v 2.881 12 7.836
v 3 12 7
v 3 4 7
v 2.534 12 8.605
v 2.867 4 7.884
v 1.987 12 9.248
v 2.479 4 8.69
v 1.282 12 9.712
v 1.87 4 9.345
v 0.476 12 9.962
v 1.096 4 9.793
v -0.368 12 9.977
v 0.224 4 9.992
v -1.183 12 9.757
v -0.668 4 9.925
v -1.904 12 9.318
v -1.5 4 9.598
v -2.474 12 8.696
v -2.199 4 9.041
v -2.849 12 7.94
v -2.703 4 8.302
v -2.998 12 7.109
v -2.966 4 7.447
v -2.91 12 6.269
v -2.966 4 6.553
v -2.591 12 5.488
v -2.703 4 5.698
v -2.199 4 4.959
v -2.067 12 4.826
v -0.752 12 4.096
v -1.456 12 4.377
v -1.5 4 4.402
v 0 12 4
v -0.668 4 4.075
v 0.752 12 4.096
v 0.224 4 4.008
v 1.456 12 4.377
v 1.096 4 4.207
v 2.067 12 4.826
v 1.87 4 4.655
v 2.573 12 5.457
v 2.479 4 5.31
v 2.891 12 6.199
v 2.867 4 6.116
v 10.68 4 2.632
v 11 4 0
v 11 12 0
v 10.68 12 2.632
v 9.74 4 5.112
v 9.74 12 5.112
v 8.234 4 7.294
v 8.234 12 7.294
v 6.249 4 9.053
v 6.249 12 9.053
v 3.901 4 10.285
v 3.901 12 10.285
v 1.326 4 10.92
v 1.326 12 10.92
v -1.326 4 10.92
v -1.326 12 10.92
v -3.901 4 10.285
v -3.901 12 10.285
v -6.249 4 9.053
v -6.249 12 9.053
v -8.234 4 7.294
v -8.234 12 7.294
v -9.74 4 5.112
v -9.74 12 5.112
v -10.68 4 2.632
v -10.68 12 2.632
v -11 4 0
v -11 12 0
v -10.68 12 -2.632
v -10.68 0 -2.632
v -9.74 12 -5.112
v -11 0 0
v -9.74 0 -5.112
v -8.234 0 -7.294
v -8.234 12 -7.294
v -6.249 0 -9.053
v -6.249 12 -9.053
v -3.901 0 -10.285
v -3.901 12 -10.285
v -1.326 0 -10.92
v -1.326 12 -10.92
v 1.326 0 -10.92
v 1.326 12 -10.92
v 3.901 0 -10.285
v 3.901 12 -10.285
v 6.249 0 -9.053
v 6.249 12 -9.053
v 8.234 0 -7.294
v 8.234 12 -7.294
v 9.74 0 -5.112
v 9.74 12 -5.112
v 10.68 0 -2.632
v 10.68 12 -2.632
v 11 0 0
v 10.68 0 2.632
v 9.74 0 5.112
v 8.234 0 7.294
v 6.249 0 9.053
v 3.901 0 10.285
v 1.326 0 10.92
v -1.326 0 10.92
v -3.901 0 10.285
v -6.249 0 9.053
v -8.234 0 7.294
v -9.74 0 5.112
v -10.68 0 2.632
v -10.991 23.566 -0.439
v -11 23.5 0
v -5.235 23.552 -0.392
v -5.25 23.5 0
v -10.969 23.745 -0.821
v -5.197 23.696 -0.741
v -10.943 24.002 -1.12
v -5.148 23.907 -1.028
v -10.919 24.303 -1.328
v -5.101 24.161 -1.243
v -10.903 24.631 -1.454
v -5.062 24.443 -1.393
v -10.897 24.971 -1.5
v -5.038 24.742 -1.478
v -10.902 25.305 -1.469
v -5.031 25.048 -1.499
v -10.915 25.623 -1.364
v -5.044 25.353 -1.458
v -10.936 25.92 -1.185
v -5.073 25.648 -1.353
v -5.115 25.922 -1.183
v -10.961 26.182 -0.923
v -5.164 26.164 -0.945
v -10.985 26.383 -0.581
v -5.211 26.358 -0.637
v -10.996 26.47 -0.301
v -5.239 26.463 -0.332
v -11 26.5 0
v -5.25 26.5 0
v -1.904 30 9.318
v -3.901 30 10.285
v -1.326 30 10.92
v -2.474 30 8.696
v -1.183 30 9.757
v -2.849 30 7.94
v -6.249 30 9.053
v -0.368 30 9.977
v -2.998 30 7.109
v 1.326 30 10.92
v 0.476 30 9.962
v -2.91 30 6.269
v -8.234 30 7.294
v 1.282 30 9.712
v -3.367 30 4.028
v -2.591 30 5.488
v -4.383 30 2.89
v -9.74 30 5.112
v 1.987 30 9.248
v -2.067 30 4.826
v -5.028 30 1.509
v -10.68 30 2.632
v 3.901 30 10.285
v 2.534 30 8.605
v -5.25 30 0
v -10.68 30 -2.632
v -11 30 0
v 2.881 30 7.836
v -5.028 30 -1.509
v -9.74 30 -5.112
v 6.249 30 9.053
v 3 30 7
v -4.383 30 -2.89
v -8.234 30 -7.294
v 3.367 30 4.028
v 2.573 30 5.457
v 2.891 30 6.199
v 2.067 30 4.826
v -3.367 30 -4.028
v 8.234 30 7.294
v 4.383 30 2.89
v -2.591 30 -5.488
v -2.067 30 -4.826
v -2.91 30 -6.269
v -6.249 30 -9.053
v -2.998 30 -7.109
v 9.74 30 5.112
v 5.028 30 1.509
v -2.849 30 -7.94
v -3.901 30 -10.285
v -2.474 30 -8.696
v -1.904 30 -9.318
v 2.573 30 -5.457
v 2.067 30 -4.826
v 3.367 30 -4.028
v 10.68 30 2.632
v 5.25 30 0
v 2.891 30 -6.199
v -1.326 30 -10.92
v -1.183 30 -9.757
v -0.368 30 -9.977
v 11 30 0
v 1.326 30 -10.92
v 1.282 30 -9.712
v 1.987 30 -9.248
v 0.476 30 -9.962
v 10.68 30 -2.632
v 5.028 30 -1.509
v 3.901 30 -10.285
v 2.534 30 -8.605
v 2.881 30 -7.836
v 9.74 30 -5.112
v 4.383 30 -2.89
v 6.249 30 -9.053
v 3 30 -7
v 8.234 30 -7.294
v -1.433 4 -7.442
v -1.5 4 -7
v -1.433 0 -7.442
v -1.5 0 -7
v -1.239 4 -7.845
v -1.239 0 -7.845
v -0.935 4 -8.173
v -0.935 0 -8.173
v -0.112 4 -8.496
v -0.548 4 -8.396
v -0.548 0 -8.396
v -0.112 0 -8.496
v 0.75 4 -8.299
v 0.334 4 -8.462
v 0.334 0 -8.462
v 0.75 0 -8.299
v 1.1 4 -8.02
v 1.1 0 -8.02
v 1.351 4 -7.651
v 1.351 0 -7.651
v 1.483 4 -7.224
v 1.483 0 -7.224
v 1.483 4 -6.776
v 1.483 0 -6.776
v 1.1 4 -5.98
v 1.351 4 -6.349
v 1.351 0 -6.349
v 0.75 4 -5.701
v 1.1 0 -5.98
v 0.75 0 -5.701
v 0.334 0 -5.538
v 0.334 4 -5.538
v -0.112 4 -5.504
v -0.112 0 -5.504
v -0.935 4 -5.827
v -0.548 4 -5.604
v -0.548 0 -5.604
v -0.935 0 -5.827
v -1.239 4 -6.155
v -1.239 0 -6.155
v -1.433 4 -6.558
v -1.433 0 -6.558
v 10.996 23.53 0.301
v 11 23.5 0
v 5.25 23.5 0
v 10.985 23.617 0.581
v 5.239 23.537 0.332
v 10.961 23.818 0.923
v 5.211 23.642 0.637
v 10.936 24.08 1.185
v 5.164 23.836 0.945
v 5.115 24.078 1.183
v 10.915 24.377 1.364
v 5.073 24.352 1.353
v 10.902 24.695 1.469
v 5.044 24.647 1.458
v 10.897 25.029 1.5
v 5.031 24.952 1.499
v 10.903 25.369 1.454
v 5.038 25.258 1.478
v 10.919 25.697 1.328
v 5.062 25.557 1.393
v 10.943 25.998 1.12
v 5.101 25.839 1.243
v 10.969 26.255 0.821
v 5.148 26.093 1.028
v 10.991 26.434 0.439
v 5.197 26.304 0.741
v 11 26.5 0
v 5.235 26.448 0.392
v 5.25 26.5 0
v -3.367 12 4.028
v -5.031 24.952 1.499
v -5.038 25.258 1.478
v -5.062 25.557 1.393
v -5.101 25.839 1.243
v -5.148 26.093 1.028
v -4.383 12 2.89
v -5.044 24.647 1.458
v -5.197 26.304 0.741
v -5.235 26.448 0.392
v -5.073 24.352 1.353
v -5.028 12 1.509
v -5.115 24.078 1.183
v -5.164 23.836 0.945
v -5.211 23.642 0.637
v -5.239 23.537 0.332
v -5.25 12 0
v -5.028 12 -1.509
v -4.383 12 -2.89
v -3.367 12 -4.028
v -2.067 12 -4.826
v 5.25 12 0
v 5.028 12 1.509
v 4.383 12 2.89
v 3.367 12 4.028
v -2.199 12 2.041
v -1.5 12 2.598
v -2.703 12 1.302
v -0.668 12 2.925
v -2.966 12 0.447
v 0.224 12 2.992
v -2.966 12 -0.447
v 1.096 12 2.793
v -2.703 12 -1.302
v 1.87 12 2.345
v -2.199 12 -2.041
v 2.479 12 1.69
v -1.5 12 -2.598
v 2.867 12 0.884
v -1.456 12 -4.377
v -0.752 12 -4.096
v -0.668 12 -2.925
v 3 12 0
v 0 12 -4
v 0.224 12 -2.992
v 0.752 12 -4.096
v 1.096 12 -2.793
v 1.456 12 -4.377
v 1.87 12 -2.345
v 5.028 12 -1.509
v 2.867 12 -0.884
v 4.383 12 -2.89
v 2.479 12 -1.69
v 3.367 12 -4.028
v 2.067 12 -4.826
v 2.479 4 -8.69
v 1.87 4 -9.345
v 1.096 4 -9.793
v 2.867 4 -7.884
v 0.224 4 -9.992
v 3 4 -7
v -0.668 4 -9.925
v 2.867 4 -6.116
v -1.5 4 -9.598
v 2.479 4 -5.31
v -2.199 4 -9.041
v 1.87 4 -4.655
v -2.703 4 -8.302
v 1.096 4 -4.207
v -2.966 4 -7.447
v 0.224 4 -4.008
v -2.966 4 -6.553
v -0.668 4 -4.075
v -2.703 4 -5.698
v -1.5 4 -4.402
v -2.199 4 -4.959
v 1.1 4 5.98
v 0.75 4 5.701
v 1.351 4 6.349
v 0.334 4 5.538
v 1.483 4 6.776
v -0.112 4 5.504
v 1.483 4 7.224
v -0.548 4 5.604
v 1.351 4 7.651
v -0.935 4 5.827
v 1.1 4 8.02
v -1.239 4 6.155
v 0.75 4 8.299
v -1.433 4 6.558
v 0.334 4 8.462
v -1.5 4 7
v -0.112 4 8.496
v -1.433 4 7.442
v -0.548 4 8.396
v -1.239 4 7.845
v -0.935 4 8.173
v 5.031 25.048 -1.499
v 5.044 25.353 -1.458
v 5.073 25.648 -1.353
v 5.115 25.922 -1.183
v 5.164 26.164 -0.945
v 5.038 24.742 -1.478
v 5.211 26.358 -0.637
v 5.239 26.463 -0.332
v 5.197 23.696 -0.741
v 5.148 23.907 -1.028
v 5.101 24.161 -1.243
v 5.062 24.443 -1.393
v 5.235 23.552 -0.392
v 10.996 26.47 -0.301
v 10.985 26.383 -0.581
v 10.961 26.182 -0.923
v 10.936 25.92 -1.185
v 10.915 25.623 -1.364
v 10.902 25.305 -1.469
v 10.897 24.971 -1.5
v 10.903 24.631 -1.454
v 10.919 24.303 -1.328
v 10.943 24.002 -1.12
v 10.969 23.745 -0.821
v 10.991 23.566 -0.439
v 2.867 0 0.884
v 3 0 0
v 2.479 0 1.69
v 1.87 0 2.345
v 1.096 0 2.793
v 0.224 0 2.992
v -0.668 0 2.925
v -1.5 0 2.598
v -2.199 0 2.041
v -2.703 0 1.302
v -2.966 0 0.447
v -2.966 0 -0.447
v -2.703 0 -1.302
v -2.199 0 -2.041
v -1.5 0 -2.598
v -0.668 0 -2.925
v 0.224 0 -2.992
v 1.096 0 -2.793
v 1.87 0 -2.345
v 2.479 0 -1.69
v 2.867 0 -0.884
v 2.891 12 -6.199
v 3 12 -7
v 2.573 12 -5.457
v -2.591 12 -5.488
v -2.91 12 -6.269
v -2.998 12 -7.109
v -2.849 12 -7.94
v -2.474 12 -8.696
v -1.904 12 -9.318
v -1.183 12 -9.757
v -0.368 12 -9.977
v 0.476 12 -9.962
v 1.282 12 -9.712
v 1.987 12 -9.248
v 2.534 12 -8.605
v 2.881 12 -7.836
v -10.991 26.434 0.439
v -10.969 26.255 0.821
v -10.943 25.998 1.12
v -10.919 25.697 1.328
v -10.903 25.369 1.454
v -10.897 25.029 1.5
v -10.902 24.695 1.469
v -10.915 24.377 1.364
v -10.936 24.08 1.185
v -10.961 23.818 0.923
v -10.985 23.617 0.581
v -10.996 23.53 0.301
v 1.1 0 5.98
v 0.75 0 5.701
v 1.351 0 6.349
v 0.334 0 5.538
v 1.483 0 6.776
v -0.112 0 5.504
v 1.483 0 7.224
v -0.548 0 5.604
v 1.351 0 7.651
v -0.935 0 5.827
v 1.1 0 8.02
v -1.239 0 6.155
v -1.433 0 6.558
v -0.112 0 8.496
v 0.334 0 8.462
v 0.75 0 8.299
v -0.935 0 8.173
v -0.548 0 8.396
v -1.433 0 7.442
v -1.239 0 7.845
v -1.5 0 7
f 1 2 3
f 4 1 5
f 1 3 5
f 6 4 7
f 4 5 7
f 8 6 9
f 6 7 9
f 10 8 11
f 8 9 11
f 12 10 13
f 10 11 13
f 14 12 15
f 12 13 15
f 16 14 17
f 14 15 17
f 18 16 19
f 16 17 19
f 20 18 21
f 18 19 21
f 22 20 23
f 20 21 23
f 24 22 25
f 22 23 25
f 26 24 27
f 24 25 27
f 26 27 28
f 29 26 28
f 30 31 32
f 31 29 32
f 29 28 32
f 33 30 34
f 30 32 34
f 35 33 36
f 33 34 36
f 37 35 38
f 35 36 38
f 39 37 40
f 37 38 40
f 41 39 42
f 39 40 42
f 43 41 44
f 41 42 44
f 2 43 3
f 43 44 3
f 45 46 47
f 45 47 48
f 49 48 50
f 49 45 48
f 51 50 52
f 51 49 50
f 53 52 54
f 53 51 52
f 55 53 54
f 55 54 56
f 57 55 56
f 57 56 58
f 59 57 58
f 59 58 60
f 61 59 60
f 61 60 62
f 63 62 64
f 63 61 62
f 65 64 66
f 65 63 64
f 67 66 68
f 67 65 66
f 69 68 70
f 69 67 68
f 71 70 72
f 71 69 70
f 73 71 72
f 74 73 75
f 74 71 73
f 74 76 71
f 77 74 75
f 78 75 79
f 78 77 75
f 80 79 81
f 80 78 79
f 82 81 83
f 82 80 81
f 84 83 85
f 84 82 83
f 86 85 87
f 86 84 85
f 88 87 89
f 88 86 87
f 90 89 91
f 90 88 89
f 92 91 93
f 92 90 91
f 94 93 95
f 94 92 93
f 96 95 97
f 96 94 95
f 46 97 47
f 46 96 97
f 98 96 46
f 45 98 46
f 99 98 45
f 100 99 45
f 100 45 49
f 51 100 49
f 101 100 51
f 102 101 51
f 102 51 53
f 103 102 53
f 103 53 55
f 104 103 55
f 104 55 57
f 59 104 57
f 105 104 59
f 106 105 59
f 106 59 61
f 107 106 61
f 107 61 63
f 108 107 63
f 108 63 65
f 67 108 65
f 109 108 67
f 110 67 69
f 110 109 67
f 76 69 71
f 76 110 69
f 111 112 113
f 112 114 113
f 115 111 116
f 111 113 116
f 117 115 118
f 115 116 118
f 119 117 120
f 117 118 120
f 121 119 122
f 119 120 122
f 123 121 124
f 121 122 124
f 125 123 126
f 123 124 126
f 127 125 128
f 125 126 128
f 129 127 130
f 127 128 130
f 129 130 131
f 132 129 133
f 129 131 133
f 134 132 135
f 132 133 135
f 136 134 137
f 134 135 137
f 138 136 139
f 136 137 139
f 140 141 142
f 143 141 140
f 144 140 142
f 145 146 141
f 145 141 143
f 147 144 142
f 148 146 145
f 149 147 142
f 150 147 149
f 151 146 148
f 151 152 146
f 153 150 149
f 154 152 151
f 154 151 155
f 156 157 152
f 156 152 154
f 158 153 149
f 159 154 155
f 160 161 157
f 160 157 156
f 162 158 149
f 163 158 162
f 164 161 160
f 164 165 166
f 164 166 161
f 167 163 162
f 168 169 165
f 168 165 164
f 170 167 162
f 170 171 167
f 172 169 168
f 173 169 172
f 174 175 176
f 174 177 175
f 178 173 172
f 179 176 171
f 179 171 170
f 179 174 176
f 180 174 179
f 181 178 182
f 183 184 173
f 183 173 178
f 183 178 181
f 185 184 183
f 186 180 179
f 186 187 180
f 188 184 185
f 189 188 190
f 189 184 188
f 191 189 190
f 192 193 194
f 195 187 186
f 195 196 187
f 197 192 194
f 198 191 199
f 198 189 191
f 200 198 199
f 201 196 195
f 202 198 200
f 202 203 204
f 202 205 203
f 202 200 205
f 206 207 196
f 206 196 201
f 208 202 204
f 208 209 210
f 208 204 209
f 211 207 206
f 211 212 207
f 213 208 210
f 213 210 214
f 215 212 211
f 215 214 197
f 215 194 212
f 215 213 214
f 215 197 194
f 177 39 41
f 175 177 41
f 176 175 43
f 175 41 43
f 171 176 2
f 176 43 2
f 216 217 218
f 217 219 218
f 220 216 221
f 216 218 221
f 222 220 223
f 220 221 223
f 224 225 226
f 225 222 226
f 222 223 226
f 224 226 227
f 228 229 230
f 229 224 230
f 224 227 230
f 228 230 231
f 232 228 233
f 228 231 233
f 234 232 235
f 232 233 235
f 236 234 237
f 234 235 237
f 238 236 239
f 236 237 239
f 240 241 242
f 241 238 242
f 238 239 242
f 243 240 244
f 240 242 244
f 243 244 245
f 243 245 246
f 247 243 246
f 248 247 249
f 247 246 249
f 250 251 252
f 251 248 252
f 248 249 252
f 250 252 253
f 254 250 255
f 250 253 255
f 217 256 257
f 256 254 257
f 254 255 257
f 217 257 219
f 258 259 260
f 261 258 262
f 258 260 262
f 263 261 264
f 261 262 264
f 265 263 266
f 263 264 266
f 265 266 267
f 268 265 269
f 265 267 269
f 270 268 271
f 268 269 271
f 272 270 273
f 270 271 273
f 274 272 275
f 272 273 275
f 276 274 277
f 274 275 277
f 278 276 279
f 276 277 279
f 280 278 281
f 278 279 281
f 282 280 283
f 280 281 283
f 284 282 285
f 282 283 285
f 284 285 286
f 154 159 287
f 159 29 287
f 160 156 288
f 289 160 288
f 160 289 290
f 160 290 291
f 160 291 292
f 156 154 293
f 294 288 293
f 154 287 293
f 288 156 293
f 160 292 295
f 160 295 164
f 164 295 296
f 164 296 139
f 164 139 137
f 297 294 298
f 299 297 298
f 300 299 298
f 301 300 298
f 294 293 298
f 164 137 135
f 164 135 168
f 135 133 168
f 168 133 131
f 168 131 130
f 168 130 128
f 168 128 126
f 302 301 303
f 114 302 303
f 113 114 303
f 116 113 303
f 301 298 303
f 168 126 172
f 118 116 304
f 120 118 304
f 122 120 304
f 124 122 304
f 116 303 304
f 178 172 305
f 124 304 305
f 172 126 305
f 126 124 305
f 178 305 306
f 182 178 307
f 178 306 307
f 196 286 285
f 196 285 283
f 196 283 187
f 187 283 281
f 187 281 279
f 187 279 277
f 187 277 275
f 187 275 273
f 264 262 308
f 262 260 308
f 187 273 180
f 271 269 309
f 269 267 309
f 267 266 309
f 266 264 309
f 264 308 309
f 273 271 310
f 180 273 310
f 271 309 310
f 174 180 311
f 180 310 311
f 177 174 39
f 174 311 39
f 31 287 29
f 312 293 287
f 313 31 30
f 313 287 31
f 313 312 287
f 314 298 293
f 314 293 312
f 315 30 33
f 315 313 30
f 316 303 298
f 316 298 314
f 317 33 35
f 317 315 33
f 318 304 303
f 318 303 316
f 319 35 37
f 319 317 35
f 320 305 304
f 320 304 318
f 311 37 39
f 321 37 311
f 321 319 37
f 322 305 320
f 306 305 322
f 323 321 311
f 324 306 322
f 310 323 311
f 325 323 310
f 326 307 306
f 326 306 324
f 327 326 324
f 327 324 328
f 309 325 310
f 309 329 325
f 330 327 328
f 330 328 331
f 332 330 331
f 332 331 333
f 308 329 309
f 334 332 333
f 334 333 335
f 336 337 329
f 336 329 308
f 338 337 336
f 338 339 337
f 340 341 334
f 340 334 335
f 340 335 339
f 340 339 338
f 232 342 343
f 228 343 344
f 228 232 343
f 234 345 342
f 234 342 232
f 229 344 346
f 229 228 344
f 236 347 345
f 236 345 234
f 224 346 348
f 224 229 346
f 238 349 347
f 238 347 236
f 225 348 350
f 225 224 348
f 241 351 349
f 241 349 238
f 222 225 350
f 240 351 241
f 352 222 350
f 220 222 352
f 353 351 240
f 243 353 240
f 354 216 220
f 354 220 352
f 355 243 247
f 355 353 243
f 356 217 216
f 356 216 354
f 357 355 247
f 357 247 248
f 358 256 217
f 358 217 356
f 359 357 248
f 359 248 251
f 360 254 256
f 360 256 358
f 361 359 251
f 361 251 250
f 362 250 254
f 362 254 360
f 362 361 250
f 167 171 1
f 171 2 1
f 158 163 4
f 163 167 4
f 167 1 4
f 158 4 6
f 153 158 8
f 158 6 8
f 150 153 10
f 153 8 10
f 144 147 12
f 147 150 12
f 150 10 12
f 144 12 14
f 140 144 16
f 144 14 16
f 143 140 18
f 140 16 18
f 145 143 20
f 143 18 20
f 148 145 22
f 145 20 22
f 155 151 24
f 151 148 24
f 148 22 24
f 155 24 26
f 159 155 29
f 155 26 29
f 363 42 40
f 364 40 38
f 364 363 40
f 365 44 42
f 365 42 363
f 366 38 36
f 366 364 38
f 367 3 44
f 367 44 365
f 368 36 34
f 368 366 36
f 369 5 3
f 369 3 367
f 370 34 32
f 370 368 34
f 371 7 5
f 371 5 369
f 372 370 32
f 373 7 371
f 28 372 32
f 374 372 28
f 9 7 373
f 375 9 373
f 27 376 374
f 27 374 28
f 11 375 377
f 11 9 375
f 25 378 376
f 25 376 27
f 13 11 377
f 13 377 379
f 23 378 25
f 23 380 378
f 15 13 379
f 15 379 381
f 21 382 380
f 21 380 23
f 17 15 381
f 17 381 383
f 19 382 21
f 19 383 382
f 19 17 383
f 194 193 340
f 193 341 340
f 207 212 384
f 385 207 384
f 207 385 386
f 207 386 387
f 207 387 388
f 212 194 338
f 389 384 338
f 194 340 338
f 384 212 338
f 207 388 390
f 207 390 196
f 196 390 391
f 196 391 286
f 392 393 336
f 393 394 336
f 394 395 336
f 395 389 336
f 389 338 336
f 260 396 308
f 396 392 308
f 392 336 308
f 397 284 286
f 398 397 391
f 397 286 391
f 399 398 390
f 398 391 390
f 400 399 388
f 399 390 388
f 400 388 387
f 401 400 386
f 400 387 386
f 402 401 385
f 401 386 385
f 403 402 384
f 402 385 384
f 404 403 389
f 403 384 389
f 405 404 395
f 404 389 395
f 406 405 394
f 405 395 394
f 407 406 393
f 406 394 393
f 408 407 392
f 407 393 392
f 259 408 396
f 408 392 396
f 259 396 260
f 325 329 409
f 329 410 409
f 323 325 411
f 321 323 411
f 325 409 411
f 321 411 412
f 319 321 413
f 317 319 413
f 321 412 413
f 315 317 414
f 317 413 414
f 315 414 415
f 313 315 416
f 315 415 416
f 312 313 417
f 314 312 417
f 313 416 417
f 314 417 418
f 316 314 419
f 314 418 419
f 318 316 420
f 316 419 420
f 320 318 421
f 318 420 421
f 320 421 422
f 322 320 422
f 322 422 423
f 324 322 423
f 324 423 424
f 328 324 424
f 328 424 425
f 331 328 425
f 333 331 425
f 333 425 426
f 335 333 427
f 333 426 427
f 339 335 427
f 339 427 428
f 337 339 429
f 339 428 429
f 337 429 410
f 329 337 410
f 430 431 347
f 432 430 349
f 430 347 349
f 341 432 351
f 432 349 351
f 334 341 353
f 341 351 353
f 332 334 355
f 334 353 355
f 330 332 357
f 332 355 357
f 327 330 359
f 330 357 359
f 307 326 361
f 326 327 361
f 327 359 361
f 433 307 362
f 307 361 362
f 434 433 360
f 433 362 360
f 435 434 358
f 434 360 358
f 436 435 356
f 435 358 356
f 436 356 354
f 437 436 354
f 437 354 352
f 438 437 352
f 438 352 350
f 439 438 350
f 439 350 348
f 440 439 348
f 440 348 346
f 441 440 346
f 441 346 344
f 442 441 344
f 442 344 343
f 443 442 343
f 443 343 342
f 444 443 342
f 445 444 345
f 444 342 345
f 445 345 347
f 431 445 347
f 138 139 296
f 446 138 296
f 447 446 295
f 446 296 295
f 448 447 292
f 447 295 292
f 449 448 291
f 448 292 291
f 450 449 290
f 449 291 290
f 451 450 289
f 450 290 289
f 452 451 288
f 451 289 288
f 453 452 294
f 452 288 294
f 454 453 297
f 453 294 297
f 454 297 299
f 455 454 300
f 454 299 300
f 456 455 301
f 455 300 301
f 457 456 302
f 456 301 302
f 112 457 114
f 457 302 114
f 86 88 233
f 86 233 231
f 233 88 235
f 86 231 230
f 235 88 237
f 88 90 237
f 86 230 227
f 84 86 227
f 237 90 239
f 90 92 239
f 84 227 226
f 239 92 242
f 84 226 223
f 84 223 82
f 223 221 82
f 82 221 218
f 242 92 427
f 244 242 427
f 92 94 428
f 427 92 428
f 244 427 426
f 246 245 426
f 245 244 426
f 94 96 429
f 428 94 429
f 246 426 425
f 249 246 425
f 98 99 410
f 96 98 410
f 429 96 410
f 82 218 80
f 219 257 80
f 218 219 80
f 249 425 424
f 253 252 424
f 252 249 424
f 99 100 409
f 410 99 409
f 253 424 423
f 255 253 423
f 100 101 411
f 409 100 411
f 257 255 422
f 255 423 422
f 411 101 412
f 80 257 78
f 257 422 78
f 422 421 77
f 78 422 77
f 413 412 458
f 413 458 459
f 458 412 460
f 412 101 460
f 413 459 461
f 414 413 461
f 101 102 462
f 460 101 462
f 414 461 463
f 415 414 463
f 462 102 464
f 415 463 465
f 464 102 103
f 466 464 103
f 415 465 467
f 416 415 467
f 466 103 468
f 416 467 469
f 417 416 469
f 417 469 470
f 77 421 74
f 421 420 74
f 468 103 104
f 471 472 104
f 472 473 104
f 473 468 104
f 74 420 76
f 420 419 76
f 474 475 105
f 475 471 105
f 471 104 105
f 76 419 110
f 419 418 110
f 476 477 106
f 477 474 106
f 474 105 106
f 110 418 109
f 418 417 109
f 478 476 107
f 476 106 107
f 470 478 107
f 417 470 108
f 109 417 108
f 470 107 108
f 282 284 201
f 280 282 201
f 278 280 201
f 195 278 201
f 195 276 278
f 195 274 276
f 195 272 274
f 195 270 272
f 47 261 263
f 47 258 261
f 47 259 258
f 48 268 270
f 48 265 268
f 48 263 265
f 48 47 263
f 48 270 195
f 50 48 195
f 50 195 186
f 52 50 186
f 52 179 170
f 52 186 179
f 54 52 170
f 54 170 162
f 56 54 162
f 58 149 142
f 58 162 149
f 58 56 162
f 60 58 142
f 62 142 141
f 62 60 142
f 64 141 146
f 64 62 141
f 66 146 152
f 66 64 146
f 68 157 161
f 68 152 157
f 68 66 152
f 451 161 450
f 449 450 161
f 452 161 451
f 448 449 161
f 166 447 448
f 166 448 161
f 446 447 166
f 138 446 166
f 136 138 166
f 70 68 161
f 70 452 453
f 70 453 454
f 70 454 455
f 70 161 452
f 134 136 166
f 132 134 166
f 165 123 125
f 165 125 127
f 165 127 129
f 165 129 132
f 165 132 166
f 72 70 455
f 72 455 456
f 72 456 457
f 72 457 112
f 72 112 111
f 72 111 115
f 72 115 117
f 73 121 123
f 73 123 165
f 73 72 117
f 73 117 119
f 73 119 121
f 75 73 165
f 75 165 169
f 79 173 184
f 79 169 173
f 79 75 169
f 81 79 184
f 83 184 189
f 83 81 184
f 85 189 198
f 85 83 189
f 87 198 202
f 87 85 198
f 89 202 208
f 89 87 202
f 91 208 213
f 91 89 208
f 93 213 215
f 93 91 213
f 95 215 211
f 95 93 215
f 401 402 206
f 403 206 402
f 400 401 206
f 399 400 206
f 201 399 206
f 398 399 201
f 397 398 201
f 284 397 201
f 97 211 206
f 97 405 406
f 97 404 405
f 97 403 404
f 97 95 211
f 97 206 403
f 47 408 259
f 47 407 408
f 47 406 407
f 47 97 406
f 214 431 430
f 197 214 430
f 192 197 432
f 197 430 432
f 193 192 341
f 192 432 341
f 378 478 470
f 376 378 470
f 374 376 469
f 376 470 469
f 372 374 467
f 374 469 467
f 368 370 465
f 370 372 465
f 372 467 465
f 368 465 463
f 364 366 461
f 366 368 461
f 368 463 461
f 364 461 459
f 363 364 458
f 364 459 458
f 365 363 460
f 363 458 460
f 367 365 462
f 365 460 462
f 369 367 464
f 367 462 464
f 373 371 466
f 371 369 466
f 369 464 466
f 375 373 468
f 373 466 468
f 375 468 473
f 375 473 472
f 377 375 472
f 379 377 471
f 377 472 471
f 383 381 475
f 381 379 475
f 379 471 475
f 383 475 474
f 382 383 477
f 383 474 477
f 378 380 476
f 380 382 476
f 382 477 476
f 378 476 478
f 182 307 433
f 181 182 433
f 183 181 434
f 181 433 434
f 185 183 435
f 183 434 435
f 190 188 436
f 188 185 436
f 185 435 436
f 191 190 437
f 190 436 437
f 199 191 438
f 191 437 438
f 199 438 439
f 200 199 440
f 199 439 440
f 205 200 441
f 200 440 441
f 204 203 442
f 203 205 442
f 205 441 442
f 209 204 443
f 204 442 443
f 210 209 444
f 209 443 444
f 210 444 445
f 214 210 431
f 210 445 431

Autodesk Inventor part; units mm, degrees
ref_plane "YZ Plane" through (0, 0, 0) normal (1, 0, 0) x (0, 1, 0)
ref_plane "XZ Plane" through (0, 0, 0) normal (0, 1, 0) x (-1, 0, 0)
ref_plane "XY Plane" through (0, 0, 0) normal (0, 0, 1) x (1, 0, 0)
sketch "Boceto5" plane through (0, 0, 0) normal (0, 1, 0) x (-1, 0, 0)
  circle A0 centre (0, 0) radius 11
  line L0 (0, 0) -> (0, -7)
  line L1 (0, 0) -> (0, 7)
  circle A1 centre (0, 7) radius 1.5
  circle A2 centre (0, -7) radius 1.5
  dimension "d25" = 22
  dimension "d26" = 7
  dimension "d27" = 7
  dimension "d28" = 3
  dimension "d29" = 3
extrude "Extrusión6" add sketch "Boceto5" along normal blind 4
sketch "Boceto6" plane through (0, 4, 0) normal (0, 1, 0) x (1, 0, 0)
  circle A0 centre (0, 0) radius 11
  circle A1 centre (0, -7) radius 1.5 projected
  circle A2 centre (0, -7) radius 3
  circle A3 centre (0, 7) radius 1.5 projected
  circle A4 centre (0, 7) radius 3
  dimension "d32" = 6
  dimension "d33" = 6
extrude "Extrusión7" add sketch "Boceto6" along normal blind 8 contours A0
sketch "Boceto7" plane through (0, 12, 0) normal (0, 1, 0) x (1, 0, 0)
  circle A0 centre (0, 0) radius 5.25
  circle A1 centre (0, -7) radius 3 projected
  circle A2 centre (0, -7) radius 3
  circle A3 centre (0, 7) radius 1.5 projected
  circle A4 centre (0, 7) radius 3
  circle A5 centre (0, 0) radius 11
  dimension "d36" = 10.5
extrude "Extrusión8" add sketch "Boceto7" along normal blind 20 contours A5
sketch "Boceto8" plane through (0, 0, 0) normal (1, 0, 0) x (0, 1, 0)
  line L0 (0, 0) -> (23, 0)
  line L1 (23, 0) -> (25, 0)
  circle A0 centre (25, 0) radius 1.5
  dimension "d39" = 23
  dimension "d43" = 2
  dimension "d44" = 3
extrude "Extrusión10" cut sketch "Boceto8" along normal mid plane 22
move faces "Desplazar2" translate (0, -2, 0) faces at (5.0629, 32, -5.6904)
sketch "Boceto9" plane through (0, 0, 0) normal (0, -1, 0) x (1, 0, 0)
  circle A0 centre (0, 0) radius 3
  dimension "d52" = 6
extrude "Extrusión11" cut sketch "Boceto9" against normal blind 12
properties part number "end_effector_connector_arm2_grande"
